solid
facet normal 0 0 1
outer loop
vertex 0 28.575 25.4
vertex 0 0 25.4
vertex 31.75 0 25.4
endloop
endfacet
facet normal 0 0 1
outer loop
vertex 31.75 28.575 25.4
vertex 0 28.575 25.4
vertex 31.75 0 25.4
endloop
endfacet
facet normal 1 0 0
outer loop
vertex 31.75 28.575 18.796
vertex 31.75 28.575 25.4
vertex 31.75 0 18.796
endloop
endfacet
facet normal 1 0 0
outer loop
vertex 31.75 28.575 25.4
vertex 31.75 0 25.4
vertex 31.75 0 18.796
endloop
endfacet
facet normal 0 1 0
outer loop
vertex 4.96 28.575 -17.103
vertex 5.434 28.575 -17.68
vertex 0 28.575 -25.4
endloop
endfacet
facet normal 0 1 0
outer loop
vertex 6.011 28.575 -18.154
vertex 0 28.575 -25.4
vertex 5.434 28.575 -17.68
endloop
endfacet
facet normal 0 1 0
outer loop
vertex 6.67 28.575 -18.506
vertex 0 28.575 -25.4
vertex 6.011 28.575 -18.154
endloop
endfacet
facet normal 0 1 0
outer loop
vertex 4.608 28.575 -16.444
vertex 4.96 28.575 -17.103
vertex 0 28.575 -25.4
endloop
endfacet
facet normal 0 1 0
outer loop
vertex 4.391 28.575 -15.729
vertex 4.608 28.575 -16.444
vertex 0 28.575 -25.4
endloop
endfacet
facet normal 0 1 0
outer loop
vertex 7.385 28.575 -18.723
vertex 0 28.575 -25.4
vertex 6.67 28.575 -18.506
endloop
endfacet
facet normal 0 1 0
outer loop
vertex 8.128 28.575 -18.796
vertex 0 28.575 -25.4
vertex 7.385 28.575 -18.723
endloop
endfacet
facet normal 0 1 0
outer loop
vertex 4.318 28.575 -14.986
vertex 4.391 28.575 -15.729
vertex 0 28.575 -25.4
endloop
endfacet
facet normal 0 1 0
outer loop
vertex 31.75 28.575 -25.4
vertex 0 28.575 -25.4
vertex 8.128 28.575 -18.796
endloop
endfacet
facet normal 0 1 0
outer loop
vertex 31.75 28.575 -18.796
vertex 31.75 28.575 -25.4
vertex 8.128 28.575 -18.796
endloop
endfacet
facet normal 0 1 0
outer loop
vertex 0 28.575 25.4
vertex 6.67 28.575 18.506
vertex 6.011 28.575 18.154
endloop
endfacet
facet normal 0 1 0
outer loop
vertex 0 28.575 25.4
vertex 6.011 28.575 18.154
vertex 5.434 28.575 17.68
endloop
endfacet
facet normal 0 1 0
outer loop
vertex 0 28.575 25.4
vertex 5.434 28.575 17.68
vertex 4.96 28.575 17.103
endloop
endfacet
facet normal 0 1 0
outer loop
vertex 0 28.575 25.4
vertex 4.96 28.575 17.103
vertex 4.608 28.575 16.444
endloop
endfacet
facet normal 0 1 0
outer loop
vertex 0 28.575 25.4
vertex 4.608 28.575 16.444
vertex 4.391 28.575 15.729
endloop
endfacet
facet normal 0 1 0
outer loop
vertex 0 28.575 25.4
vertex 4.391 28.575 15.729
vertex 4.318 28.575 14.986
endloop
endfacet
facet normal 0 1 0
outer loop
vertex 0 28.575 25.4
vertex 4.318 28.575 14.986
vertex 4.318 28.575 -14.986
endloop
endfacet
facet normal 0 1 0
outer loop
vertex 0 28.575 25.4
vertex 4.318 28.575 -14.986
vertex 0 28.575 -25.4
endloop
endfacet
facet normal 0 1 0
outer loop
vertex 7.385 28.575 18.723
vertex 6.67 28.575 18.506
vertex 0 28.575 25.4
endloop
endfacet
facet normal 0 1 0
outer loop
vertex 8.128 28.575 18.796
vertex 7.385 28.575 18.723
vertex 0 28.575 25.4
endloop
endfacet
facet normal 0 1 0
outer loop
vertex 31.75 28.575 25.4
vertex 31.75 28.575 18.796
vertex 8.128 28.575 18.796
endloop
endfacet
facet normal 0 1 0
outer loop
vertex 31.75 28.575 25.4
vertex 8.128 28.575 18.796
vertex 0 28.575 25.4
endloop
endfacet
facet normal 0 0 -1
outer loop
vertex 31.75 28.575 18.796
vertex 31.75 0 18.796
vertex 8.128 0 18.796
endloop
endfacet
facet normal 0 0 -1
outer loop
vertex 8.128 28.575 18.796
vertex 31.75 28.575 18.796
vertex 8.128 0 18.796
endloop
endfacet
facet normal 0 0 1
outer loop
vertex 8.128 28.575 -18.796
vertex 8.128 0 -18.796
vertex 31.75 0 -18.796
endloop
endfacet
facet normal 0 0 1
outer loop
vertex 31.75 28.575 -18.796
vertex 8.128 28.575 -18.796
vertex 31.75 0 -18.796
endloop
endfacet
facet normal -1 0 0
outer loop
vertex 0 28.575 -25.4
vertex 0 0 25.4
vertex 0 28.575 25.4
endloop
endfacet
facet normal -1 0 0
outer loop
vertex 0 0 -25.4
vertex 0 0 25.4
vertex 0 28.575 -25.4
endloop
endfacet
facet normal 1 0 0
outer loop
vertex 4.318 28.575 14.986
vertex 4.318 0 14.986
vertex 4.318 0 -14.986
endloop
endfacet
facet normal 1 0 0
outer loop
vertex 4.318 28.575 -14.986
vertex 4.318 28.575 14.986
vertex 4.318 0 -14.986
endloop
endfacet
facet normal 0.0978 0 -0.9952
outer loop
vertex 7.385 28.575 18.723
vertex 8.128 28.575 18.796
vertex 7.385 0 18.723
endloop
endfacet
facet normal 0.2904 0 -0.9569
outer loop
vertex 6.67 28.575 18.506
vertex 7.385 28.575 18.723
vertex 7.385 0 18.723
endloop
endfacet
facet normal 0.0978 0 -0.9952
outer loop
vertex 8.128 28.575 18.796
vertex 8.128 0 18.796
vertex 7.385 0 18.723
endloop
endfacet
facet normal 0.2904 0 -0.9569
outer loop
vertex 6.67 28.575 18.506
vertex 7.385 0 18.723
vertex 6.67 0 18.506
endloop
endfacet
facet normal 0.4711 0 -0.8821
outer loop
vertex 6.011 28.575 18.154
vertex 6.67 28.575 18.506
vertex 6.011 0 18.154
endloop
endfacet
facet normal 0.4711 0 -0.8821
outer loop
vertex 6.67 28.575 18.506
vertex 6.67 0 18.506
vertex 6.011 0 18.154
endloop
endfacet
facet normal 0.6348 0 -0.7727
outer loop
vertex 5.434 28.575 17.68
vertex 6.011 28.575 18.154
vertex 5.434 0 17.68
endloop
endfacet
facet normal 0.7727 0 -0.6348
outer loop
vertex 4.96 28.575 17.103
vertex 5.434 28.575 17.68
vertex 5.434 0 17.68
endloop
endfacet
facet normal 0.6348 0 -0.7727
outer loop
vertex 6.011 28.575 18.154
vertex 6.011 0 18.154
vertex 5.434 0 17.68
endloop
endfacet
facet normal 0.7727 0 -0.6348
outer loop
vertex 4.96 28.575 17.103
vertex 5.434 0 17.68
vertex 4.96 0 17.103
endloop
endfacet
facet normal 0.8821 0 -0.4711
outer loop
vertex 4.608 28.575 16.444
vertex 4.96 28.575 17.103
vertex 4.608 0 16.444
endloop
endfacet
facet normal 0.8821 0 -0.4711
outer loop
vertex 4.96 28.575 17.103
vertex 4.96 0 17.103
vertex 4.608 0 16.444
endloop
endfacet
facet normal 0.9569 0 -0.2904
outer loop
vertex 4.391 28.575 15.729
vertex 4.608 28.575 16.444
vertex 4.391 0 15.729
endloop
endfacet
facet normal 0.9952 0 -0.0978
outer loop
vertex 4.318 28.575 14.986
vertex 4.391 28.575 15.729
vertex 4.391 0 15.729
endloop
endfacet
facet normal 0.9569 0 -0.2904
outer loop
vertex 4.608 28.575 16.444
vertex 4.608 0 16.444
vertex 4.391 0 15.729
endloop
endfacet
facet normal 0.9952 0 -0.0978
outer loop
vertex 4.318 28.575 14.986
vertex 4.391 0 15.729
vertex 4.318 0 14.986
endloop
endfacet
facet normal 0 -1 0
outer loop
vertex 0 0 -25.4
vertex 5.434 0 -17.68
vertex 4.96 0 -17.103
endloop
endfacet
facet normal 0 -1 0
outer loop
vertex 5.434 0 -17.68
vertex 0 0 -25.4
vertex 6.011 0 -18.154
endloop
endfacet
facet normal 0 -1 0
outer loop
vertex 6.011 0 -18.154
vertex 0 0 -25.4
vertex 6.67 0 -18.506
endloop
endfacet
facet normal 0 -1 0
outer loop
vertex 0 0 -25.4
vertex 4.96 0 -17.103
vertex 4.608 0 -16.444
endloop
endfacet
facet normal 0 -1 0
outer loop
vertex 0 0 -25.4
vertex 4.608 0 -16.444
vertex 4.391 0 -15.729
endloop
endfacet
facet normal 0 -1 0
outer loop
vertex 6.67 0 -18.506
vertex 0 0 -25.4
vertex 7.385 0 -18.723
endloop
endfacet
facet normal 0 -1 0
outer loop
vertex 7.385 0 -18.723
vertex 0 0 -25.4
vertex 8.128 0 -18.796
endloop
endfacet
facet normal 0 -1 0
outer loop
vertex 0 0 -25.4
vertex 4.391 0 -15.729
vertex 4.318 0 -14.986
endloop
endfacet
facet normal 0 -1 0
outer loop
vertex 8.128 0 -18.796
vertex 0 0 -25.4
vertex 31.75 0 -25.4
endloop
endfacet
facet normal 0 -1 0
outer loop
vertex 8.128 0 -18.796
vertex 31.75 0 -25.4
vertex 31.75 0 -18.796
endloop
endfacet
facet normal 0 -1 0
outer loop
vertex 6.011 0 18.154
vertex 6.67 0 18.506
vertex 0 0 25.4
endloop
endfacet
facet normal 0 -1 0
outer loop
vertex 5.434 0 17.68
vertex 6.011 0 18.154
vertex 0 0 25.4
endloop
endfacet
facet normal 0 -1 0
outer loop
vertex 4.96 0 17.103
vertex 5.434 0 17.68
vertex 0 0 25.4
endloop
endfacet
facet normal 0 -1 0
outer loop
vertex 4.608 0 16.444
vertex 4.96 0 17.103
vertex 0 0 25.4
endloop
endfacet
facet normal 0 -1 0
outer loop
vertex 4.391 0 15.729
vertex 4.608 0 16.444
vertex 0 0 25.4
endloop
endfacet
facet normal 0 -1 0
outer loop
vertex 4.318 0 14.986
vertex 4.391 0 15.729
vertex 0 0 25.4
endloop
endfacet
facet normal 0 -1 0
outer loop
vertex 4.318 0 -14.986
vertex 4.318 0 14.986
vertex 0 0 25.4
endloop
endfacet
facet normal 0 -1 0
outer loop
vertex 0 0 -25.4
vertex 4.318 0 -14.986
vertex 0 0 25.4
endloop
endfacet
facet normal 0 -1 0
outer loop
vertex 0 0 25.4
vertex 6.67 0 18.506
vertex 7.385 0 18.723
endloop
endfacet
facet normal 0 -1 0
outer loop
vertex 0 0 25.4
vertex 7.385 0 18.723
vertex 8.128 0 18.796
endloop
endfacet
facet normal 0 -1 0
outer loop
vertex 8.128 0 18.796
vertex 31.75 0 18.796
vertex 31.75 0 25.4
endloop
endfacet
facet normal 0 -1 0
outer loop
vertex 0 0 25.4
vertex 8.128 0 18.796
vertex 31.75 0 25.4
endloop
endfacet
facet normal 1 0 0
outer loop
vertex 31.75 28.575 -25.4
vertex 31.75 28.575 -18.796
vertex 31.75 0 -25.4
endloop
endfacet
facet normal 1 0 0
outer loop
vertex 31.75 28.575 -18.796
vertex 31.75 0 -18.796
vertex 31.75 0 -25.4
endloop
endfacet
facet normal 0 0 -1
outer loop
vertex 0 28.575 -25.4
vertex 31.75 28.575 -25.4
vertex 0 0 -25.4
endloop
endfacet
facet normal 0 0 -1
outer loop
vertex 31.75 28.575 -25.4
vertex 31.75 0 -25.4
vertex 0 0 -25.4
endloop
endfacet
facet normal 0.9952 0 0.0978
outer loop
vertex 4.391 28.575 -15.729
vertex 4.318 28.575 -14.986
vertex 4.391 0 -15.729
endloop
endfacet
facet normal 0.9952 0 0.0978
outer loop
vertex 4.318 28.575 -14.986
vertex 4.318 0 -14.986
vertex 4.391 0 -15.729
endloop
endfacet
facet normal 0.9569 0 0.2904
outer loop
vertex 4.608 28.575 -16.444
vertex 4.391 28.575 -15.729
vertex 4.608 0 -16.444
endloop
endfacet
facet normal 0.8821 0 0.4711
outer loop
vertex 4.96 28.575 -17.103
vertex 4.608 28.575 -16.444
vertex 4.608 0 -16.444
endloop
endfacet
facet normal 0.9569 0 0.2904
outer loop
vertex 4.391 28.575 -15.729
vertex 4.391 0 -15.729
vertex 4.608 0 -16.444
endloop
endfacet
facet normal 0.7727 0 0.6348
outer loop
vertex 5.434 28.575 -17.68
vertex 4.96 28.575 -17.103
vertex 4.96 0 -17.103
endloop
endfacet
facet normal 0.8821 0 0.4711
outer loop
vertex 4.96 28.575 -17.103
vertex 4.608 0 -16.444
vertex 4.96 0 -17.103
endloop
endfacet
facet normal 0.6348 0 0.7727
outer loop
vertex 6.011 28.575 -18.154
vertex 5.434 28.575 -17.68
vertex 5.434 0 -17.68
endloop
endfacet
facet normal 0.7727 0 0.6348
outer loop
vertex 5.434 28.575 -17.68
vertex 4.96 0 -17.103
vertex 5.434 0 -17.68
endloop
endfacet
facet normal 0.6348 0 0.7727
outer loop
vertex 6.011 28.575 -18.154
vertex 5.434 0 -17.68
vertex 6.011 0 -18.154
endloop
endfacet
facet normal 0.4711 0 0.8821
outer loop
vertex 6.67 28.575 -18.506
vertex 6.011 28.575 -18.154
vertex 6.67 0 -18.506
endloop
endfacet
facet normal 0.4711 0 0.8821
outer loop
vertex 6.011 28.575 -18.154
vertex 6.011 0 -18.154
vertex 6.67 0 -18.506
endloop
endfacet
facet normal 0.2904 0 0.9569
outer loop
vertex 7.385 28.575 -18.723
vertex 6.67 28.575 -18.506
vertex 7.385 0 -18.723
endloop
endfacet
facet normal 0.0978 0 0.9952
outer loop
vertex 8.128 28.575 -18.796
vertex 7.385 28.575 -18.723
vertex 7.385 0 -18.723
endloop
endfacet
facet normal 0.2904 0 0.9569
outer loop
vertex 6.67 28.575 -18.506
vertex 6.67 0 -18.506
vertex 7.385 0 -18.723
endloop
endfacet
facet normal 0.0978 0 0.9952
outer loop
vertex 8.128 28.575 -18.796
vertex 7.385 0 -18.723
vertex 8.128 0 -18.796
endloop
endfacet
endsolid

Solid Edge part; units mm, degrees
sketch "Sketch1" plane through (0, 0, 0) normal (0, -1, 0) x (1, 0, 0)
  line L0 (0, 25.4) -> (31.75, 25.4)
  line L1 (31.75, 25.4) -> (31.75, 18.796)
  line L2 (31.75, 18.796) -> (8.128, 18.796)
  arc A0 (8.128, 18.796) -> (4.318, 14.986) centre (8.128, 14.986) ccw
  line L3 (4.318, 14.986) -> (4.318, -14.986)
  arc A1 (4.318, -14.986) -> (8.128, -18.796) centre (8.128, -14.986) ccw
  line L4 (8.128, -18.796) -> (31.75, -18.796)
  line L5 (31.75, -18.796) -> (31.75, -25.4)
  line L6 (31.75, -25.4) -> (0, -25.4)
  line L7 (0, 25.4) -> (0, -25.4)
  dimension "D1" = 31.75
  dimension "D2" = 31.75
extrude "Protrusion1" add sketch "Sketch1" against normal blind 28.575
